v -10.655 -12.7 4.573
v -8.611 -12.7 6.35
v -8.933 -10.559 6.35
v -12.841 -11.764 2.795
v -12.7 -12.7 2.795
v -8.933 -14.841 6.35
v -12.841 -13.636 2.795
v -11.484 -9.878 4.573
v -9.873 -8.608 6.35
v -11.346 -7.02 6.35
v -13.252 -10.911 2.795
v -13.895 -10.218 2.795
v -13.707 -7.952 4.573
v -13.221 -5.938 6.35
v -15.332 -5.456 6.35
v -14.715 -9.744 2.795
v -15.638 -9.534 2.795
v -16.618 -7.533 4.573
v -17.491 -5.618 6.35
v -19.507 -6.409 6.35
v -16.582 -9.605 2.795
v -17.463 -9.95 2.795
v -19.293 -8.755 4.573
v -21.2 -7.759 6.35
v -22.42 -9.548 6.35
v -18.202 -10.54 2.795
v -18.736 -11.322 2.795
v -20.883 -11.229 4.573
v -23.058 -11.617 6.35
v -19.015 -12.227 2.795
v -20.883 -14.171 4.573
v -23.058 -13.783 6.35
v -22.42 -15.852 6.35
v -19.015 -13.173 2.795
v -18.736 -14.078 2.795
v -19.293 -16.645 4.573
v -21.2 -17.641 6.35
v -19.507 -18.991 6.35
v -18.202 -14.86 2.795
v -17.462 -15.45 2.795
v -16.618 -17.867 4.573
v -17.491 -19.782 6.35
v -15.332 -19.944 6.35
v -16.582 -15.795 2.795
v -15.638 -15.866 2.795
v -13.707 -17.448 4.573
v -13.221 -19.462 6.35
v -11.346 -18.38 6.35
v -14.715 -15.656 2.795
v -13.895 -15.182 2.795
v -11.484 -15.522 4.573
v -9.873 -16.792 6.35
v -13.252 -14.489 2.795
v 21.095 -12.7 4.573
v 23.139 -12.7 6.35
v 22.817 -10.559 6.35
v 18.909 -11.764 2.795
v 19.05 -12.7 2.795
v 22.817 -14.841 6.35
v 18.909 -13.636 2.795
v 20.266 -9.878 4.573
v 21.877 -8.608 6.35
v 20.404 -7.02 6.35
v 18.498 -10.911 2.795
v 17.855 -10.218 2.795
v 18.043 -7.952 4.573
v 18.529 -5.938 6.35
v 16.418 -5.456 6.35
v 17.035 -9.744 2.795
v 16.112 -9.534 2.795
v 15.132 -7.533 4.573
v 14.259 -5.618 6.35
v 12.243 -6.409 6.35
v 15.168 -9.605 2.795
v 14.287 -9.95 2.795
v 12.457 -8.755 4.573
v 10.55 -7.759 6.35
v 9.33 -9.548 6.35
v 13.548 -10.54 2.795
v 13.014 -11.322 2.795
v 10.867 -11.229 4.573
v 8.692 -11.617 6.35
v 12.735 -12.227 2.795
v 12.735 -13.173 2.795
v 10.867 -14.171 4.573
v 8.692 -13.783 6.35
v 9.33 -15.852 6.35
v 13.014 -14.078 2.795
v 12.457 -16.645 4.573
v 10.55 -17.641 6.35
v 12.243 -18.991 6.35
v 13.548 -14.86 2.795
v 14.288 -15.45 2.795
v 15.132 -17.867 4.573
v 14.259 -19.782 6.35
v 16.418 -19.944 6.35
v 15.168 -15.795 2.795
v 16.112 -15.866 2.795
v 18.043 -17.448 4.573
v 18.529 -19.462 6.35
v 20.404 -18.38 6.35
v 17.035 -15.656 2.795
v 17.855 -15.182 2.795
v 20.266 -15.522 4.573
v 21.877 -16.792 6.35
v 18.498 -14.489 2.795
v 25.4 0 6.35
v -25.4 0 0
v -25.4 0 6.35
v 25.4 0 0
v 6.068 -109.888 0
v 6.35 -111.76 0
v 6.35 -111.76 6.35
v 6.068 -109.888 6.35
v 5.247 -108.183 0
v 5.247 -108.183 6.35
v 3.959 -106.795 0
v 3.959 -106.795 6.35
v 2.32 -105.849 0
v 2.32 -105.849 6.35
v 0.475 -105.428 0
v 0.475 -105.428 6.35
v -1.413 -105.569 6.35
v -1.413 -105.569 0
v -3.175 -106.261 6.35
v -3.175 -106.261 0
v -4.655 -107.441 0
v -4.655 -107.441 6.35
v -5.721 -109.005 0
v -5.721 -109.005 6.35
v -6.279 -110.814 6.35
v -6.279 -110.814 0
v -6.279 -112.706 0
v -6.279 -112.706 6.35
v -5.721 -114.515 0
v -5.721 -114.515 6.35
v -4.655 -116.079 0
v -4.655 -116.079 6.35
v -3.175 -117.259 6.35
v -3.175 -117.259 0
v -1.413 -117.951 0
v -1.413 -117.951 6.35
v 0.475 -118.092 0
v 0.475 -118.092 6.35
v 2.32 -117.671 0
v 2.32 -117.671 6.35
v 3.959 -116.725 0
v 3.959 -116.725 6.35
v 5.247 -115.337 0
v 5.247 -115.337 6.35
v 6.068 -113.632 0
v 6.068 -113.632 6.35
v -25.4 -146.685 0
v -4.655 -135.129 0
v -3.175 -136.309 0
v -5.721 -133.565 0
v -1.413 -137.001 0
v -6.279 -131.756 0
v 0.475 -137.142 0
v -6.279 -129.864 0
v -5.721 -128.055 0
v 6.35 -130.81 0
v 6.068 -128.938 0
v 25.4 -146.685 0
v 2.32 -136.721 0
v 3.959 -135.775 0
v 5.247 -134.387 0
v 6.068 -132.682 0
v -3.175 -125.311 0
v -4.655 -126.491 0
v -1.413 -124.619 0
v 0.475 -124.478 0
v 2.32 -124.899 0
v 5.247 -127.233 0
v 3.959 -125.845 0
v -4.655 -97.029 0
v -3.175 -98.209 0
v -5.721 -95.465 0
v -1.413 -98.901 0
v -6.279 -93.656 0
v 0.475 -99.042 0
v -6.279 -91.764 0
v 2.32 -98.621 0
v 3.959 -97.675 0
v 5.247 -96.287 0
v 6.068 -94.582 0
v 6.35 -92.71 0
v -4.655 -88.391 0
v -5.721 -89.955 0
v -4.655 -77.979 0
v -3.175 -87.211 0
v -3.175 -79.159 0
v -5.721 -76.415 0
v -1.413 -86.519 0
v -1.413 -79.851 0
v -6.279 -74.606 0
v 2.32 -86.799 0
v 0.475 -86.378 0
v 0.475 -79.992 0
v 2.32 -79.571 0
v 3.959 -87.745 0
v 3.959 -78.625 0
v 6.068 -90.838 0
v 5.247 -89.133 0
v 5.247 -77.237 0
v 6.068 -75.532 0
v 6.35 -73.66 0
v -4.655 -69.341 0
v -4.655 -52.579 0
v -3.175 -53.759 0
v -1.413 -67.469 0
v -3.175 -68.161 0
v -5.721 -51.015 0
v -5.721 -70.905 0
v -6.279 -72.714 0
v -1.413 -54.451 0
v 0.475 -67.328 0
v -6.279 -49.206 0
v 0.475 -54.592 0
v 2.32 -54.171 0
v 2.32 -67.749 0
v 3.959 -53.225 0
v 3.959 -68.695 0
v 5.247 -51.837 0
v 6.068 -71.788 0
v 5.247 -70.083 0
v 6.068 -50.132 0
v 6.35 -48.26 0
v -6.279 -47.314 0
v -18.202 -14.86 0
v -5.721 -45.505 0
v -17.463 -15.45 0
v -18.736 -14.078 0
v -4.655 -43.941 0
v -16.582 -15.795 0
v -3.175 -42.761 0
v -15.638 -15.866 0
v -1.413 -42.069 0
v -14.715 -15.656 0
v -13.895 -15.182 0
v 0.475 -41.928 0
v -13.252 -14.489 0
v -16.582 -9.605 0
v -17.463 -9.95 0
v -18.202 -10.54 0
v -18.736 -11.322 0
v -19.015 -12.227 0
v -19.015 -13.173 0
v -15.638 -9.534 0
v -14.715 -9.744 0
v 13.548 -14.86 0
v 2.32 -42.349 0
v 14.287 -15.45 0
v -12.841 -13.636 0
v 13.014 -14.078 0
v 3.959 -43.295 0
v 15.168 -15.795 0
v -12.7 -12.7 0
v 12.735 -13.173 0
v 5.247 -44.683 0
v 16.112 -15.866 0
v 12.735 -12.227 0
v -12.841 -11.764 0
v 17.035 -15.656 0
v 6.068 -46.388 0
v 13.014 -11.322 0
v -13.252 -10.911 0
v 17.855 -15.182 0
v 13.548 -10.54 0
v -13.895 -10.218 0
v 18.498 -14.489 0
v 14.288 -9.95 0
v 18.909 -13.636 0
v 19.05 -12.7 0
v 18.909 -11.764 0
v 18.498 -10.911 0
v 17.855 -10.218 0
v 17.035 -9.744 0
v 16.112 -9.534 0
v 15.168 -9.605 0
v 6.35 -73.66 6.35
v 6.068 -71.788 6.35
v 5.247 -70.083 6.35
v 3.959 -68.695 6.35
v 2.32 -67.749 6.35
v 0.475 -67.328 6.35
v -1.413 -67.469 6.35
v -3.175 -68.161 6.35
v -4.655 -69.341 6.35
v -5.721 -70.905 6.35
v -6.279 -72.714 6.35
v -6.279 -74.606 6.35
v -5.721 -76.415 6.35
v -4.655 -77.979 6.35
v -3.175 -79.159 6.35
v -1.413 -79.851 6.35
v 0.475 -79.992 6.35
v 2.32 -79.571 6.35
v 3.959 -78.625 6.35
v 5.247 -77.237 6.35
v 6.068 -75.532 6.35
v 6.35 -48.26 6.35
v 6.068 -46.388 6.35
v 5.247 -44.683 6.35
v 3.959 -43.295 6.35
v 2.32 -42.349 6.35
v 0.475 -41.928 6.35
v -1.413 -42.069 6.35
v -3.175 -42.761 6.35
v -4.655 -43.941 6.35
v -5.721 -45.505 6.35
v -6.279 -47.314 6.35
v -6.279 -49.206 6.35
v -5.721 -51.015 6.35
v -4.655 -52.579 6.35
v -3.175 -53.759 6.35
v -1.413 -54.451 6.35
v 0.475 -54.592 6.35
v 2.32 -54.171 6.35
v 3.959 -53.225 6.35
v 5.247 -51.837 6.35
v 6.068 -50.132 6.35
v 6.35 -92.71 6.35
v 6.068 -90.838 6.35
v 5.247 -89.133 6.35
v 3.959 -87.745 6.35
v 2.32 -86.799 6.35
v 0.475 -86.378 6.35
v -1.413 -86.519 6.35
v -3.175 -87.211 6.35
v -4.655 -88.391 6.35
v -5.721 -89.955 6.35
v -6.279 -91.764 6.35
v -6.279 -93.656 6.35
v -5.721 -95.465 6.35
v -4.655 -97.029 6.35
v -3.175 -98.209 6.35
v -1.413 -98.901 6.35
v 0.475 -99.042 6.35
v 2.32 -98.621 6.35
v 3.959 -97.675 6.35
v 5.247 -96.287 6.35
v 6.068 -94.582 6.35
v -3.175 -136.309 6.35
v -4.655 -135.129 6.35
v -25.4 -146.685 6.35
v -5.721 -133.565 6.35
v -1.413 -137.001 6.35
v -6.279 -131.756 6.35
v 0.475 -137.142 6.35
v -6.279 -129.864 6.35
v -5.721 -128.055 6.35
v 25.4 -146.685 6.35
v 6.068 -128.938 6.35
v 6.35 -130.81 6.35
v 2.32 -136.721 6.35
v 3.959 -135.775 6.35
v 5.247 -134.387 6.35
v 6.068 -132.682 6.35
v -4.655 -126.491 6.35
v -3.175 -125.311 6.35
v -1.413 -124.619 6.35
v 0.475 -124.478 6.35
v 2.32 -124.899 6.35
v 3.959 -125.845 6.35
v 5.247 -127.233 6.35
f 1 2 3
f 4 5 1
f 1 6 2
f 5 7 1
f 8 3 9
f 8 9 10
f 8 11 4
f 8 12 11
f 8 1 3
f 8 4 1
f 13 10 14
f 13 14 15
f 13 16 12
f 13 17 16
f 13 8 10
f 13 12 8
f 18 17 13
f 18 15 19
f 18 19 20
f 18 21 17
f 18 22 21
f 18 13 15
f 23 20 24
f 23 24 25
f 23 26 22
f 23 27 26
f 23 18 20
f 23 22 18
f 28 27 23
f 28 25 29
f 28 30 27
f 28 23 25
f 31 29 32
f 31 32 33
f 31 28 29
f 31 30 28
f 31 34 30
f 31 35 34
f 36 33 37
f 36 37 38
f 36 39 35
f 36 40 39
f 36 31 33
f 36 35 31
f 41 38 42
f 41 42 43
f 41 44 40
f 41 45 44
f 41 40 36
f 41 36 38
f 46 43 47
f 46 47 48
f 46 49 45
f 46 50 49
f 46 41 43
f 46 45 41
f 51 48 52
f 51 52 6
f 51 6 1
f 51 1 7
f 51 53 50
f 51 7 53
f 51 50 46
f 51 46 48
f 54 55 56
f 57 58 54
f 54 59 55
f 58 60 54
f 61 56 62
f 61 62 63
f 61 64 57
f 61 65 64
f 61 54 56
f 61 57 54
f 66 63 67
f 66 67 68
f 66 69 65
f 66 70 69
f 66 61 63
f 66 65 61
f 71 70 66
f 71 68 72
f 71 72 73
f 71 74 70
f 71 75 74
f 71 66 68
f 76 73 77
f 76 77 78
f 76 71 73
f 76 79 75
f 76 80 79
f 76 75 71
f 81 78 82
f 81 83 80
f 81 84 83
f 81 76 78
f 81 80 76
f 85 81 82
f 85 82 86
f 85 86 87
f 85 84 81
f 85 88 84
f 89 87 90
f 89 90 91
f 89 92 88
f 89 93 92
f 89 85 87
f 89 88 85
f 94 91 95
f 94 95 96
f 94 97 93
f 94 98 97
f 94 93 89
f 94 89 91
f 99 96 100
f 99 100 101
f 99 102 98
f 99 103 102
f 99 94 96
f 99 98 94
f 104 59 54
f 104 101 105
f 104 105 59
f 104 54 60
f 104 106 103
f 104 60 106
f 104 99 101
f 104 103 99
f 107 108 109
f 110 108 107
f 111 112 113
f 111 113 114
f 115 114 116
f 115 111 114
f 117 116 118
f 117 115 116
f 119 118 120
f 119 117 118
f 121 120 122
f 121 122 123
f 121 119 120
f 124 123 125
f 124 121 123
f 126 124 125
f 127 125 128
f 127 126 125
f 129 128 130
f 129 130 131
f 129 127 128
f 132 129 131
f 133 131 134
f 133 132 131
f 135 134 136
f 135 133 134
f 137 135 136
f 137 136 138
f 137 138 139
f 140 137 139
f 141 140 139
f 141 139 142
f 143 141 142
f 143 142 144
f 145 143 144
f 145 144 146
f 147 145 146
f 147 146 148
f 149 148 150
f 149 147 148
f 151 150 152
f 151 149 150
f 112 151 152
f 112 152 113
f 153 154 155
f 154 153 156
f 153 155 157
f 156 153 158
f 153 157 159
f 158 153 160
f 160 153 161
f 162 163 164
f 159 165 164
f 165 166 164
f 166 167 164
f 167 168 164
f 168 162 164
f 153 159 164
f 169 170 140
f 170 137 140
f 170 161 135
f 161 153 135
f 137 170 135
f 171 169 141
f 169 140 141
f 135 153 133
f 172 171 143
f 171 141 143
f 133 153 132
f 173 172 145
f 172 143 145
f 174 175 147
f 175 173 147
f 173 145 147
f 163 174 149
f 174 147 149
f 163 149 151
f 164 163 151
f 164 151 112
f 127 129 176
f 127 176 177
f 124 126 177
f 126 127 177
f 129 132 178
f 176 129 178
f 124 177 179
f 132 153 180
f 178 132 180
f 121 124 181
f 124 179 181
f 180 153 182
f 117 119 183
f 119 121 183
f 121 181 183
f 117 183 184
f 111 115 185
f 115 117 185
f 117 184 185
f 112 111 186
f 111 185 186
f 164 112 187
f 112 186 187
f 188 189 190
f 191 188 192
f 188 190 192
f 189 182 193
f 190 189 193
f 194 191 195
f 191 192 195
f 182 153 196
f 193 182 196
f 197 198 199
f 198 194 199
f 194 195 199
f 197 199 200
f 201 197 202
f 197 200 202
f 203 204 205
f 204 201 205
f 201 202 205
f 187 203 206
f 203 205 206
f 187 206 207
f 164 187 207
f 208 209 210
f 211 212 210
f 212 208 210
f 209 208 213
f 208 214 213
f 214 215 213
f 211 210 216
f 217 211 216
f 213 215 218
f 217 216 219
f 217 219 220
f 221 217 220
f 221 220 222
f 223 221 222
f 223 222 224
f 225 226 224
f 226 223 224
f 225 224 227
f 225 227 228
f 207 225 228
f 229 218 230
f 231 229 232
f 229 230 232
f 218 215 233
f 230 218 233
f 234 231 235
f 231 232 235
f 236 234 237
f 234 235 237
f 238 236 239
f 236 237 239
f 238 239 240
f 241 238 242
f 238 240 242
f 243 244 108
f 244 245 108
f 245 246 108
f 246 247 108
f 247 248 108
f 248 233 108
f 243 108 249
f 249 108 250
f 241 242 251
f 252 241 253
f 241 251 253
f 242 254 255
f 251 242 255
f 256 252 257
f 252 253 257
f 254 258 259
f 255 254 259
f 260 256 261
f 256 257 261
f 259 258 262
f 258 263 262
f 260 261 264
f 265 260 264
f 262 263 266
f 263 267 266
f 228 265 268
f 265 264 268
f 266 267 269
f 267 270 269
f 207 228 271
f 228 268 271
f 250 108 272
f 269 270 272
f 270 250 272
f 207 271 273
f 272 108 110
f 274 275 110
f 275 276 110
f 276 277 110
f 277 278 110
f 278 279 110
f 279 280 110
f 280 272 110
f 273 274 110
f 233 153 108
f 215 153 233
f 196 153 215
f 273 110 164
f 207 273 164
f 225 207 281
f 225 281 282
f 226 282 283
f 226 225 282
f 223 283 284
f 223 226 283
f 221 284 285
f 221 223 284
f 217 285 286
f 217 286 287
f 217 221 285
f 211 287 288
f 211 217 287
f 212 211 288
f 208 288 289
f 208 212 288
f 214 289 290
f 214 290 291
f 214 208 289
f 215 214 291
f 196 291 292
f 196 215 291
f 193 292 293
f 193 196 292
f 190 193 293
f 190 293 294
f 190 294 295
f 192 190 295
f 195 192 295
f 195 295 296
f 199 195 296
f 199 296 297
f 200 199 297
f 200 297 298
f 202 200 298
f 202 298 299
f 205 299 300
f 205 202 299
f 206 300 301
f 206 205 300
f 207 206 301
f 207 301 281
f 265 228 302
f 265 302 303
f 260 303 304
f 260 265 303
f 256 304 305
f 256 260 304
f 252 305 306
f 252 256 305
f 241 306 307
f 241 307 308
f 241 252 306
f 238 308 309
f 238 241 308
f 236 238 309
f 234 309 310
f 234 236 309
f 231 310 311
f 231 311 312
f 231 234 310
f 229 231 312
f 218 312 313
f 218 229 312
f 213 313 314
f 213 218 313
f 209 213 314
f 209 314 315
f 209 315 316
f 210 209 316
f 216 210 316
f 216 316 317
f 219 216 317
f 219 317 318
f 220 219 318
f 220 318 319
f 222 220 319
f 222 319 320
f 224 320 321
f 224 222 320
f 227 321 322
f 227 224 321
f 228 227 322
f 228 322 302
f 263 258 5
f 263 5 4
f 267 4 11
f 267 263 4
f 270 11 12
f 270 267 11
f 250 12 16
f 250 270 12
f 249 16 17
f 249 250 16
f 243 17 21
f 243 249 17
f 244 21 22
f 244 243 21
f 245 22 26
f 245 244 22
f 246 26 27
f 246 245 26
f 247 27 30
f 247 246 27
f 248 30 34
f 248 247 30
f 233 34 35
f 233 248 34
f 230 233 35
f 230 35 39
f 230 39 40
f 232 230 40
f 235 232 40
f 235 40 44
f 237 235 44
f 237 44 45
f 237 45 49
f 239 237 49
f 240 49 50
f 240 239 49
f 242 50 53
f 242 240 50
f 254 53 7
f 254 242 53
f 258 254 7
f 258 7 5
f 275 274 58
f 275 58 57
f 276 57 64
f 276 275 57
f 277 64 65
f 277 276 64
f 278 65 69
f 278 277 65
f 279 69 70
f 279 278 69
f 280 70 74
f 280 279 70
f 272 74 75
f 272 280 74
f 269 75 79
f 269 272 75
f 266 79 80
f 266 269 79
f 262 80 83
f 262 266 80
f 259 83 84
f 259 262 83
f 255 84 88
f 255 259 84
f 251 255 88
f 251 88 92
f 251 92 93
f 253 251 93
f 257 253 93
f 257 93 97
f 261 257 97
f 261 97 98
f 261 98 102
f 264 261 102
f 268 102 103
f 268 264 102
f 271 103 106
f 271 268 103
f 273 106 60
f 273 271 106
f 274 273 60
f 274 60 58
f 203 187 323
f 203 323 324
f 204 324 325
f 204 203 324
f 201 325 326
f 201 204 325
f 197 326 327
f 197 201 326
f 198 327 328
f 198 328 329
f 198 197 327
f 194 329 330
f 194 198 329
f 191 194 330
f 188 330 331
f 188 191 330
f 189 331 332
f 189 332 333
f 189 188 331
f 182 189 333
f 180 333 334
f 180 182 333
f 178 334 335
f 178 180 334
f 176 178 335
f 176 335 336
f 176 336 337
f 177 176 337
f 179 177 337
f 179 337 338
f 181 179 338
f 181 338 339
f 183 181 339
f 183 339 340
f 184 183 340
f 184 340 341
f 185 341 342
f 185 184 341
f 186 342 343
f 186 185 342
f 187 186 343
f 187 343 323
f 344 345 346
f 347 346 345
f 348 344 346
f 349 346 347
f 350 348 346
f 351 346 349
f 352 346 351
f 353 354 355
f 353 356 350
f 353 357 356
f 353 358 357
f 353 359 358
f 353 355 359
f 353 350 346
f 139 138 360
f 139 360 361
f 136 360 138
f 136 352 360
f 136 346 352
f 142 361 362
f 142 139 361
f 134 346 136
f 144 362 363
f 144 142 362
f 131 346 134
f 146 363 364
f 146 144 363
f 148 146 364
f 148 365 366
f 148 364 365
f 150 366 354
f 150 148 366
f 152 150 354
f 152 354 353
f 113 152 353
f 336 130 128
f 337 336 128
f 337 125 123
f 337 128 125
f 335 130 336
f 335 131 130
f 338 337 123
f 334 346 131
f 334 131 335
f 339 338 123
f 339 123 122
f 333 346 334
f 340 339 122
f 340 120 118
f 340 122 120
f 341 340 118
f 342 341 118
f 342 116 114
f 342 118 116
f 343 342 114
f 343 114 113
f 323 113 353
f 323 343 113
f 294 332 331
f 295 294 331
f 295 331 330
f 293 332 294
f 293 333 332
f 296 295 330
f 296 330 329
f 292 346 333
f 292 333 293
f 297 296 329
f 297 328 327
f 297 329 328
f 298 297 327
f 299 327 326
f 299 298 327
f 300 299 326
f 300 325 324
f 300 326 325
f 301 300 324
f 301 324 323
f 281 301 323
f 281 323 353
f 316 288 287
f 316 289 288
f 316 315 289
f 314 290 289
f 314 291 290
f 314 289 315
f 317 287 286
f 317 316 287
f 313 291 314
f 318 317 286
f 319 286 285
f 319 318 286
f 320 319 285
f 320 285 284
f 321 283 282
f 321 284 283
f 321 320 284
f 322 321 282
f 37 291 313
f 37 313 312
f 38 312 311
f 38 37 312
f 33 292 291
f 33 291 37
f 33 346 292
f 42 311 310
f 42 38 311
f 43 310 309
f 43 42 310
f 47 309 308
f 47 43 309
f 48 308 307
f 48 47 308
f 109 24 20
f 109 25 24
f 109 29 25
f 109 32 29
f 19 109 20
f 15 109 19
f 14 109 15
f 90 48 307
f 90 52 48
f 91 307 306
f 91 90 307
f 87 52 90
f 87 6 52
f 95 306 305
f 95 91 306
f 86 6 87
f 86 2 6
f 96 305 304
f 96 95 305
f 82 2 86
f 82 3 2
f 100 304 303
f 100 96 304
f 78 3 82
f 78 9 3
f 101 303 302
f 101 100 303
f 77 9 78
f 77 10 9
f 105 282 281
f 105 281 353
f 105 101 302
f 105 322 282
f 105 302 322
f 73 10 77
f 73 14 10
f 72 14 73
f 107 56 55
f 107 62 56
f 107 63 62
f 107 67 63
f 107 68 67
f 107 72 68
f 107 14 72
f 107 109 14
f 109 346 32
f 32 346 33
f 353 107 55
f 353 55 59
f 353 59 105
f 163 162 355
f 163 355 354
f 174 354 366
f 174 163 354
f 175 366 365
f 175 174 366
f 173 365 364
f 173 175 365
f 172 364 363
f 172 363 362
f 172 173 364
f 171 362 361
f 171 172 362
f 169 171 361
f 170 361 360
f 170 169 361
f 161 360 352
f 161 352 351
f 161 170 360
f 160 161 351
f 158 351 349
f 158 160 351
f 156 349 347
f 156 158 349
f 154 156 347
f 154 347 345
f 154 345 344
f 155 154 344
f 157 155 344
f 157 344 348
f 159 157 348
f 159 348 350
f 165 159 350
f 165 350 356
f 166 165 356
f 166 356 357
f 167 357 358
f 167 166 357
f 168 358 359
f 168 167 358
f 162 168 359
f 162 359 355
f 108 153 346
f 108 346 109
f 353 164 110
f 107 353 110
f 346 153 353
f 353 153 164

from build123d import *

# Parameters (mm, degrees)
SKETCH1_W           = 50.8
SKETCH1_H           = 146.685
SKETCH1_R           = 6.35
SKETCH1_R_2         = 3.175
BOSS_EXTRUDE3_DEPTH = 6.35
CHAMFER1_SIZE       = 4.0894
CHAMFER1_SIZE2      = 3.554861186
CHAMFER2_SIZE       = 4.0894
CHAMFER2_SIZE2      = 3.554861186


with BuildPart() as part:
    # Sketch1 → Boss-Extrude3 (new body)
    with BuildSketch(Plane.XY):
        with Locations((0, -73.3425)):
            Rectangle(SKETCH1_W, SKETCH1_H)
        with Locations((0, -130.81)):
            Circle(SKETCH1_R, mode=Mode.SUBTRACT)
        with Locations((0, -111.76)):
            Circle(SKETCH1_R, mode=Mode.SUBTRACT)
        with Locations((0, -92.71)):
            Circle(SKETCH1_R, mode=Mode.SUBTRACT)
        with Locations((0, -73.66)):
            Circle(SKETCH1_R, mode=Mode.SUBTRACT)
        with Locations((-15.875, -12.7)):
            Circle(SKETCH1_R_2, mode=Mode.SUBTRACT)
        with Locations((15.875, -12.7)):
            Circle(SKETCH1_R_2, mode=Mode.SUBTRACT)
        with Locations((0, -48.26)):
            Circle(SKETCH1_R, mode=Mode.SUBTRACT)
    extrude(amount=BOSS_EXTRUDE3_DEPTH)

    # Chamfer1
    chamfer1_edges = [part.edges().sort_by_distance(p)[0] for p in [
        (-19.05, -12.7, 6.35),
    ]]
    chamfer1_side = [part.faces().sort_by_distance(p)[0] for p in [
        (0, -145.132674995, 6.35),
    ]]
    chamfer(chamfer1_edges, length=CHAMFER1_SIZE, length2=CHAMFER1_SIZE2, reference=chamfer1_side[0])

    # Chamfer2
    chamfer2_edges = [part.edges().sort_by_distance(p)[0] for p in [
        (12.7, -12.7, 6.35),
    ]]
    chamfer2_side = [part.faces().sort_by_distance(p)[0] for p in [
        (-24.691725005, -12.7, 6.35),
    ]]
    chamfer(chamfer2_edges, length=CHAMFER2_SIZE, length2=CHAMFER2_SIZE2, reference=chamfer2_side[0])


solid = part.part
